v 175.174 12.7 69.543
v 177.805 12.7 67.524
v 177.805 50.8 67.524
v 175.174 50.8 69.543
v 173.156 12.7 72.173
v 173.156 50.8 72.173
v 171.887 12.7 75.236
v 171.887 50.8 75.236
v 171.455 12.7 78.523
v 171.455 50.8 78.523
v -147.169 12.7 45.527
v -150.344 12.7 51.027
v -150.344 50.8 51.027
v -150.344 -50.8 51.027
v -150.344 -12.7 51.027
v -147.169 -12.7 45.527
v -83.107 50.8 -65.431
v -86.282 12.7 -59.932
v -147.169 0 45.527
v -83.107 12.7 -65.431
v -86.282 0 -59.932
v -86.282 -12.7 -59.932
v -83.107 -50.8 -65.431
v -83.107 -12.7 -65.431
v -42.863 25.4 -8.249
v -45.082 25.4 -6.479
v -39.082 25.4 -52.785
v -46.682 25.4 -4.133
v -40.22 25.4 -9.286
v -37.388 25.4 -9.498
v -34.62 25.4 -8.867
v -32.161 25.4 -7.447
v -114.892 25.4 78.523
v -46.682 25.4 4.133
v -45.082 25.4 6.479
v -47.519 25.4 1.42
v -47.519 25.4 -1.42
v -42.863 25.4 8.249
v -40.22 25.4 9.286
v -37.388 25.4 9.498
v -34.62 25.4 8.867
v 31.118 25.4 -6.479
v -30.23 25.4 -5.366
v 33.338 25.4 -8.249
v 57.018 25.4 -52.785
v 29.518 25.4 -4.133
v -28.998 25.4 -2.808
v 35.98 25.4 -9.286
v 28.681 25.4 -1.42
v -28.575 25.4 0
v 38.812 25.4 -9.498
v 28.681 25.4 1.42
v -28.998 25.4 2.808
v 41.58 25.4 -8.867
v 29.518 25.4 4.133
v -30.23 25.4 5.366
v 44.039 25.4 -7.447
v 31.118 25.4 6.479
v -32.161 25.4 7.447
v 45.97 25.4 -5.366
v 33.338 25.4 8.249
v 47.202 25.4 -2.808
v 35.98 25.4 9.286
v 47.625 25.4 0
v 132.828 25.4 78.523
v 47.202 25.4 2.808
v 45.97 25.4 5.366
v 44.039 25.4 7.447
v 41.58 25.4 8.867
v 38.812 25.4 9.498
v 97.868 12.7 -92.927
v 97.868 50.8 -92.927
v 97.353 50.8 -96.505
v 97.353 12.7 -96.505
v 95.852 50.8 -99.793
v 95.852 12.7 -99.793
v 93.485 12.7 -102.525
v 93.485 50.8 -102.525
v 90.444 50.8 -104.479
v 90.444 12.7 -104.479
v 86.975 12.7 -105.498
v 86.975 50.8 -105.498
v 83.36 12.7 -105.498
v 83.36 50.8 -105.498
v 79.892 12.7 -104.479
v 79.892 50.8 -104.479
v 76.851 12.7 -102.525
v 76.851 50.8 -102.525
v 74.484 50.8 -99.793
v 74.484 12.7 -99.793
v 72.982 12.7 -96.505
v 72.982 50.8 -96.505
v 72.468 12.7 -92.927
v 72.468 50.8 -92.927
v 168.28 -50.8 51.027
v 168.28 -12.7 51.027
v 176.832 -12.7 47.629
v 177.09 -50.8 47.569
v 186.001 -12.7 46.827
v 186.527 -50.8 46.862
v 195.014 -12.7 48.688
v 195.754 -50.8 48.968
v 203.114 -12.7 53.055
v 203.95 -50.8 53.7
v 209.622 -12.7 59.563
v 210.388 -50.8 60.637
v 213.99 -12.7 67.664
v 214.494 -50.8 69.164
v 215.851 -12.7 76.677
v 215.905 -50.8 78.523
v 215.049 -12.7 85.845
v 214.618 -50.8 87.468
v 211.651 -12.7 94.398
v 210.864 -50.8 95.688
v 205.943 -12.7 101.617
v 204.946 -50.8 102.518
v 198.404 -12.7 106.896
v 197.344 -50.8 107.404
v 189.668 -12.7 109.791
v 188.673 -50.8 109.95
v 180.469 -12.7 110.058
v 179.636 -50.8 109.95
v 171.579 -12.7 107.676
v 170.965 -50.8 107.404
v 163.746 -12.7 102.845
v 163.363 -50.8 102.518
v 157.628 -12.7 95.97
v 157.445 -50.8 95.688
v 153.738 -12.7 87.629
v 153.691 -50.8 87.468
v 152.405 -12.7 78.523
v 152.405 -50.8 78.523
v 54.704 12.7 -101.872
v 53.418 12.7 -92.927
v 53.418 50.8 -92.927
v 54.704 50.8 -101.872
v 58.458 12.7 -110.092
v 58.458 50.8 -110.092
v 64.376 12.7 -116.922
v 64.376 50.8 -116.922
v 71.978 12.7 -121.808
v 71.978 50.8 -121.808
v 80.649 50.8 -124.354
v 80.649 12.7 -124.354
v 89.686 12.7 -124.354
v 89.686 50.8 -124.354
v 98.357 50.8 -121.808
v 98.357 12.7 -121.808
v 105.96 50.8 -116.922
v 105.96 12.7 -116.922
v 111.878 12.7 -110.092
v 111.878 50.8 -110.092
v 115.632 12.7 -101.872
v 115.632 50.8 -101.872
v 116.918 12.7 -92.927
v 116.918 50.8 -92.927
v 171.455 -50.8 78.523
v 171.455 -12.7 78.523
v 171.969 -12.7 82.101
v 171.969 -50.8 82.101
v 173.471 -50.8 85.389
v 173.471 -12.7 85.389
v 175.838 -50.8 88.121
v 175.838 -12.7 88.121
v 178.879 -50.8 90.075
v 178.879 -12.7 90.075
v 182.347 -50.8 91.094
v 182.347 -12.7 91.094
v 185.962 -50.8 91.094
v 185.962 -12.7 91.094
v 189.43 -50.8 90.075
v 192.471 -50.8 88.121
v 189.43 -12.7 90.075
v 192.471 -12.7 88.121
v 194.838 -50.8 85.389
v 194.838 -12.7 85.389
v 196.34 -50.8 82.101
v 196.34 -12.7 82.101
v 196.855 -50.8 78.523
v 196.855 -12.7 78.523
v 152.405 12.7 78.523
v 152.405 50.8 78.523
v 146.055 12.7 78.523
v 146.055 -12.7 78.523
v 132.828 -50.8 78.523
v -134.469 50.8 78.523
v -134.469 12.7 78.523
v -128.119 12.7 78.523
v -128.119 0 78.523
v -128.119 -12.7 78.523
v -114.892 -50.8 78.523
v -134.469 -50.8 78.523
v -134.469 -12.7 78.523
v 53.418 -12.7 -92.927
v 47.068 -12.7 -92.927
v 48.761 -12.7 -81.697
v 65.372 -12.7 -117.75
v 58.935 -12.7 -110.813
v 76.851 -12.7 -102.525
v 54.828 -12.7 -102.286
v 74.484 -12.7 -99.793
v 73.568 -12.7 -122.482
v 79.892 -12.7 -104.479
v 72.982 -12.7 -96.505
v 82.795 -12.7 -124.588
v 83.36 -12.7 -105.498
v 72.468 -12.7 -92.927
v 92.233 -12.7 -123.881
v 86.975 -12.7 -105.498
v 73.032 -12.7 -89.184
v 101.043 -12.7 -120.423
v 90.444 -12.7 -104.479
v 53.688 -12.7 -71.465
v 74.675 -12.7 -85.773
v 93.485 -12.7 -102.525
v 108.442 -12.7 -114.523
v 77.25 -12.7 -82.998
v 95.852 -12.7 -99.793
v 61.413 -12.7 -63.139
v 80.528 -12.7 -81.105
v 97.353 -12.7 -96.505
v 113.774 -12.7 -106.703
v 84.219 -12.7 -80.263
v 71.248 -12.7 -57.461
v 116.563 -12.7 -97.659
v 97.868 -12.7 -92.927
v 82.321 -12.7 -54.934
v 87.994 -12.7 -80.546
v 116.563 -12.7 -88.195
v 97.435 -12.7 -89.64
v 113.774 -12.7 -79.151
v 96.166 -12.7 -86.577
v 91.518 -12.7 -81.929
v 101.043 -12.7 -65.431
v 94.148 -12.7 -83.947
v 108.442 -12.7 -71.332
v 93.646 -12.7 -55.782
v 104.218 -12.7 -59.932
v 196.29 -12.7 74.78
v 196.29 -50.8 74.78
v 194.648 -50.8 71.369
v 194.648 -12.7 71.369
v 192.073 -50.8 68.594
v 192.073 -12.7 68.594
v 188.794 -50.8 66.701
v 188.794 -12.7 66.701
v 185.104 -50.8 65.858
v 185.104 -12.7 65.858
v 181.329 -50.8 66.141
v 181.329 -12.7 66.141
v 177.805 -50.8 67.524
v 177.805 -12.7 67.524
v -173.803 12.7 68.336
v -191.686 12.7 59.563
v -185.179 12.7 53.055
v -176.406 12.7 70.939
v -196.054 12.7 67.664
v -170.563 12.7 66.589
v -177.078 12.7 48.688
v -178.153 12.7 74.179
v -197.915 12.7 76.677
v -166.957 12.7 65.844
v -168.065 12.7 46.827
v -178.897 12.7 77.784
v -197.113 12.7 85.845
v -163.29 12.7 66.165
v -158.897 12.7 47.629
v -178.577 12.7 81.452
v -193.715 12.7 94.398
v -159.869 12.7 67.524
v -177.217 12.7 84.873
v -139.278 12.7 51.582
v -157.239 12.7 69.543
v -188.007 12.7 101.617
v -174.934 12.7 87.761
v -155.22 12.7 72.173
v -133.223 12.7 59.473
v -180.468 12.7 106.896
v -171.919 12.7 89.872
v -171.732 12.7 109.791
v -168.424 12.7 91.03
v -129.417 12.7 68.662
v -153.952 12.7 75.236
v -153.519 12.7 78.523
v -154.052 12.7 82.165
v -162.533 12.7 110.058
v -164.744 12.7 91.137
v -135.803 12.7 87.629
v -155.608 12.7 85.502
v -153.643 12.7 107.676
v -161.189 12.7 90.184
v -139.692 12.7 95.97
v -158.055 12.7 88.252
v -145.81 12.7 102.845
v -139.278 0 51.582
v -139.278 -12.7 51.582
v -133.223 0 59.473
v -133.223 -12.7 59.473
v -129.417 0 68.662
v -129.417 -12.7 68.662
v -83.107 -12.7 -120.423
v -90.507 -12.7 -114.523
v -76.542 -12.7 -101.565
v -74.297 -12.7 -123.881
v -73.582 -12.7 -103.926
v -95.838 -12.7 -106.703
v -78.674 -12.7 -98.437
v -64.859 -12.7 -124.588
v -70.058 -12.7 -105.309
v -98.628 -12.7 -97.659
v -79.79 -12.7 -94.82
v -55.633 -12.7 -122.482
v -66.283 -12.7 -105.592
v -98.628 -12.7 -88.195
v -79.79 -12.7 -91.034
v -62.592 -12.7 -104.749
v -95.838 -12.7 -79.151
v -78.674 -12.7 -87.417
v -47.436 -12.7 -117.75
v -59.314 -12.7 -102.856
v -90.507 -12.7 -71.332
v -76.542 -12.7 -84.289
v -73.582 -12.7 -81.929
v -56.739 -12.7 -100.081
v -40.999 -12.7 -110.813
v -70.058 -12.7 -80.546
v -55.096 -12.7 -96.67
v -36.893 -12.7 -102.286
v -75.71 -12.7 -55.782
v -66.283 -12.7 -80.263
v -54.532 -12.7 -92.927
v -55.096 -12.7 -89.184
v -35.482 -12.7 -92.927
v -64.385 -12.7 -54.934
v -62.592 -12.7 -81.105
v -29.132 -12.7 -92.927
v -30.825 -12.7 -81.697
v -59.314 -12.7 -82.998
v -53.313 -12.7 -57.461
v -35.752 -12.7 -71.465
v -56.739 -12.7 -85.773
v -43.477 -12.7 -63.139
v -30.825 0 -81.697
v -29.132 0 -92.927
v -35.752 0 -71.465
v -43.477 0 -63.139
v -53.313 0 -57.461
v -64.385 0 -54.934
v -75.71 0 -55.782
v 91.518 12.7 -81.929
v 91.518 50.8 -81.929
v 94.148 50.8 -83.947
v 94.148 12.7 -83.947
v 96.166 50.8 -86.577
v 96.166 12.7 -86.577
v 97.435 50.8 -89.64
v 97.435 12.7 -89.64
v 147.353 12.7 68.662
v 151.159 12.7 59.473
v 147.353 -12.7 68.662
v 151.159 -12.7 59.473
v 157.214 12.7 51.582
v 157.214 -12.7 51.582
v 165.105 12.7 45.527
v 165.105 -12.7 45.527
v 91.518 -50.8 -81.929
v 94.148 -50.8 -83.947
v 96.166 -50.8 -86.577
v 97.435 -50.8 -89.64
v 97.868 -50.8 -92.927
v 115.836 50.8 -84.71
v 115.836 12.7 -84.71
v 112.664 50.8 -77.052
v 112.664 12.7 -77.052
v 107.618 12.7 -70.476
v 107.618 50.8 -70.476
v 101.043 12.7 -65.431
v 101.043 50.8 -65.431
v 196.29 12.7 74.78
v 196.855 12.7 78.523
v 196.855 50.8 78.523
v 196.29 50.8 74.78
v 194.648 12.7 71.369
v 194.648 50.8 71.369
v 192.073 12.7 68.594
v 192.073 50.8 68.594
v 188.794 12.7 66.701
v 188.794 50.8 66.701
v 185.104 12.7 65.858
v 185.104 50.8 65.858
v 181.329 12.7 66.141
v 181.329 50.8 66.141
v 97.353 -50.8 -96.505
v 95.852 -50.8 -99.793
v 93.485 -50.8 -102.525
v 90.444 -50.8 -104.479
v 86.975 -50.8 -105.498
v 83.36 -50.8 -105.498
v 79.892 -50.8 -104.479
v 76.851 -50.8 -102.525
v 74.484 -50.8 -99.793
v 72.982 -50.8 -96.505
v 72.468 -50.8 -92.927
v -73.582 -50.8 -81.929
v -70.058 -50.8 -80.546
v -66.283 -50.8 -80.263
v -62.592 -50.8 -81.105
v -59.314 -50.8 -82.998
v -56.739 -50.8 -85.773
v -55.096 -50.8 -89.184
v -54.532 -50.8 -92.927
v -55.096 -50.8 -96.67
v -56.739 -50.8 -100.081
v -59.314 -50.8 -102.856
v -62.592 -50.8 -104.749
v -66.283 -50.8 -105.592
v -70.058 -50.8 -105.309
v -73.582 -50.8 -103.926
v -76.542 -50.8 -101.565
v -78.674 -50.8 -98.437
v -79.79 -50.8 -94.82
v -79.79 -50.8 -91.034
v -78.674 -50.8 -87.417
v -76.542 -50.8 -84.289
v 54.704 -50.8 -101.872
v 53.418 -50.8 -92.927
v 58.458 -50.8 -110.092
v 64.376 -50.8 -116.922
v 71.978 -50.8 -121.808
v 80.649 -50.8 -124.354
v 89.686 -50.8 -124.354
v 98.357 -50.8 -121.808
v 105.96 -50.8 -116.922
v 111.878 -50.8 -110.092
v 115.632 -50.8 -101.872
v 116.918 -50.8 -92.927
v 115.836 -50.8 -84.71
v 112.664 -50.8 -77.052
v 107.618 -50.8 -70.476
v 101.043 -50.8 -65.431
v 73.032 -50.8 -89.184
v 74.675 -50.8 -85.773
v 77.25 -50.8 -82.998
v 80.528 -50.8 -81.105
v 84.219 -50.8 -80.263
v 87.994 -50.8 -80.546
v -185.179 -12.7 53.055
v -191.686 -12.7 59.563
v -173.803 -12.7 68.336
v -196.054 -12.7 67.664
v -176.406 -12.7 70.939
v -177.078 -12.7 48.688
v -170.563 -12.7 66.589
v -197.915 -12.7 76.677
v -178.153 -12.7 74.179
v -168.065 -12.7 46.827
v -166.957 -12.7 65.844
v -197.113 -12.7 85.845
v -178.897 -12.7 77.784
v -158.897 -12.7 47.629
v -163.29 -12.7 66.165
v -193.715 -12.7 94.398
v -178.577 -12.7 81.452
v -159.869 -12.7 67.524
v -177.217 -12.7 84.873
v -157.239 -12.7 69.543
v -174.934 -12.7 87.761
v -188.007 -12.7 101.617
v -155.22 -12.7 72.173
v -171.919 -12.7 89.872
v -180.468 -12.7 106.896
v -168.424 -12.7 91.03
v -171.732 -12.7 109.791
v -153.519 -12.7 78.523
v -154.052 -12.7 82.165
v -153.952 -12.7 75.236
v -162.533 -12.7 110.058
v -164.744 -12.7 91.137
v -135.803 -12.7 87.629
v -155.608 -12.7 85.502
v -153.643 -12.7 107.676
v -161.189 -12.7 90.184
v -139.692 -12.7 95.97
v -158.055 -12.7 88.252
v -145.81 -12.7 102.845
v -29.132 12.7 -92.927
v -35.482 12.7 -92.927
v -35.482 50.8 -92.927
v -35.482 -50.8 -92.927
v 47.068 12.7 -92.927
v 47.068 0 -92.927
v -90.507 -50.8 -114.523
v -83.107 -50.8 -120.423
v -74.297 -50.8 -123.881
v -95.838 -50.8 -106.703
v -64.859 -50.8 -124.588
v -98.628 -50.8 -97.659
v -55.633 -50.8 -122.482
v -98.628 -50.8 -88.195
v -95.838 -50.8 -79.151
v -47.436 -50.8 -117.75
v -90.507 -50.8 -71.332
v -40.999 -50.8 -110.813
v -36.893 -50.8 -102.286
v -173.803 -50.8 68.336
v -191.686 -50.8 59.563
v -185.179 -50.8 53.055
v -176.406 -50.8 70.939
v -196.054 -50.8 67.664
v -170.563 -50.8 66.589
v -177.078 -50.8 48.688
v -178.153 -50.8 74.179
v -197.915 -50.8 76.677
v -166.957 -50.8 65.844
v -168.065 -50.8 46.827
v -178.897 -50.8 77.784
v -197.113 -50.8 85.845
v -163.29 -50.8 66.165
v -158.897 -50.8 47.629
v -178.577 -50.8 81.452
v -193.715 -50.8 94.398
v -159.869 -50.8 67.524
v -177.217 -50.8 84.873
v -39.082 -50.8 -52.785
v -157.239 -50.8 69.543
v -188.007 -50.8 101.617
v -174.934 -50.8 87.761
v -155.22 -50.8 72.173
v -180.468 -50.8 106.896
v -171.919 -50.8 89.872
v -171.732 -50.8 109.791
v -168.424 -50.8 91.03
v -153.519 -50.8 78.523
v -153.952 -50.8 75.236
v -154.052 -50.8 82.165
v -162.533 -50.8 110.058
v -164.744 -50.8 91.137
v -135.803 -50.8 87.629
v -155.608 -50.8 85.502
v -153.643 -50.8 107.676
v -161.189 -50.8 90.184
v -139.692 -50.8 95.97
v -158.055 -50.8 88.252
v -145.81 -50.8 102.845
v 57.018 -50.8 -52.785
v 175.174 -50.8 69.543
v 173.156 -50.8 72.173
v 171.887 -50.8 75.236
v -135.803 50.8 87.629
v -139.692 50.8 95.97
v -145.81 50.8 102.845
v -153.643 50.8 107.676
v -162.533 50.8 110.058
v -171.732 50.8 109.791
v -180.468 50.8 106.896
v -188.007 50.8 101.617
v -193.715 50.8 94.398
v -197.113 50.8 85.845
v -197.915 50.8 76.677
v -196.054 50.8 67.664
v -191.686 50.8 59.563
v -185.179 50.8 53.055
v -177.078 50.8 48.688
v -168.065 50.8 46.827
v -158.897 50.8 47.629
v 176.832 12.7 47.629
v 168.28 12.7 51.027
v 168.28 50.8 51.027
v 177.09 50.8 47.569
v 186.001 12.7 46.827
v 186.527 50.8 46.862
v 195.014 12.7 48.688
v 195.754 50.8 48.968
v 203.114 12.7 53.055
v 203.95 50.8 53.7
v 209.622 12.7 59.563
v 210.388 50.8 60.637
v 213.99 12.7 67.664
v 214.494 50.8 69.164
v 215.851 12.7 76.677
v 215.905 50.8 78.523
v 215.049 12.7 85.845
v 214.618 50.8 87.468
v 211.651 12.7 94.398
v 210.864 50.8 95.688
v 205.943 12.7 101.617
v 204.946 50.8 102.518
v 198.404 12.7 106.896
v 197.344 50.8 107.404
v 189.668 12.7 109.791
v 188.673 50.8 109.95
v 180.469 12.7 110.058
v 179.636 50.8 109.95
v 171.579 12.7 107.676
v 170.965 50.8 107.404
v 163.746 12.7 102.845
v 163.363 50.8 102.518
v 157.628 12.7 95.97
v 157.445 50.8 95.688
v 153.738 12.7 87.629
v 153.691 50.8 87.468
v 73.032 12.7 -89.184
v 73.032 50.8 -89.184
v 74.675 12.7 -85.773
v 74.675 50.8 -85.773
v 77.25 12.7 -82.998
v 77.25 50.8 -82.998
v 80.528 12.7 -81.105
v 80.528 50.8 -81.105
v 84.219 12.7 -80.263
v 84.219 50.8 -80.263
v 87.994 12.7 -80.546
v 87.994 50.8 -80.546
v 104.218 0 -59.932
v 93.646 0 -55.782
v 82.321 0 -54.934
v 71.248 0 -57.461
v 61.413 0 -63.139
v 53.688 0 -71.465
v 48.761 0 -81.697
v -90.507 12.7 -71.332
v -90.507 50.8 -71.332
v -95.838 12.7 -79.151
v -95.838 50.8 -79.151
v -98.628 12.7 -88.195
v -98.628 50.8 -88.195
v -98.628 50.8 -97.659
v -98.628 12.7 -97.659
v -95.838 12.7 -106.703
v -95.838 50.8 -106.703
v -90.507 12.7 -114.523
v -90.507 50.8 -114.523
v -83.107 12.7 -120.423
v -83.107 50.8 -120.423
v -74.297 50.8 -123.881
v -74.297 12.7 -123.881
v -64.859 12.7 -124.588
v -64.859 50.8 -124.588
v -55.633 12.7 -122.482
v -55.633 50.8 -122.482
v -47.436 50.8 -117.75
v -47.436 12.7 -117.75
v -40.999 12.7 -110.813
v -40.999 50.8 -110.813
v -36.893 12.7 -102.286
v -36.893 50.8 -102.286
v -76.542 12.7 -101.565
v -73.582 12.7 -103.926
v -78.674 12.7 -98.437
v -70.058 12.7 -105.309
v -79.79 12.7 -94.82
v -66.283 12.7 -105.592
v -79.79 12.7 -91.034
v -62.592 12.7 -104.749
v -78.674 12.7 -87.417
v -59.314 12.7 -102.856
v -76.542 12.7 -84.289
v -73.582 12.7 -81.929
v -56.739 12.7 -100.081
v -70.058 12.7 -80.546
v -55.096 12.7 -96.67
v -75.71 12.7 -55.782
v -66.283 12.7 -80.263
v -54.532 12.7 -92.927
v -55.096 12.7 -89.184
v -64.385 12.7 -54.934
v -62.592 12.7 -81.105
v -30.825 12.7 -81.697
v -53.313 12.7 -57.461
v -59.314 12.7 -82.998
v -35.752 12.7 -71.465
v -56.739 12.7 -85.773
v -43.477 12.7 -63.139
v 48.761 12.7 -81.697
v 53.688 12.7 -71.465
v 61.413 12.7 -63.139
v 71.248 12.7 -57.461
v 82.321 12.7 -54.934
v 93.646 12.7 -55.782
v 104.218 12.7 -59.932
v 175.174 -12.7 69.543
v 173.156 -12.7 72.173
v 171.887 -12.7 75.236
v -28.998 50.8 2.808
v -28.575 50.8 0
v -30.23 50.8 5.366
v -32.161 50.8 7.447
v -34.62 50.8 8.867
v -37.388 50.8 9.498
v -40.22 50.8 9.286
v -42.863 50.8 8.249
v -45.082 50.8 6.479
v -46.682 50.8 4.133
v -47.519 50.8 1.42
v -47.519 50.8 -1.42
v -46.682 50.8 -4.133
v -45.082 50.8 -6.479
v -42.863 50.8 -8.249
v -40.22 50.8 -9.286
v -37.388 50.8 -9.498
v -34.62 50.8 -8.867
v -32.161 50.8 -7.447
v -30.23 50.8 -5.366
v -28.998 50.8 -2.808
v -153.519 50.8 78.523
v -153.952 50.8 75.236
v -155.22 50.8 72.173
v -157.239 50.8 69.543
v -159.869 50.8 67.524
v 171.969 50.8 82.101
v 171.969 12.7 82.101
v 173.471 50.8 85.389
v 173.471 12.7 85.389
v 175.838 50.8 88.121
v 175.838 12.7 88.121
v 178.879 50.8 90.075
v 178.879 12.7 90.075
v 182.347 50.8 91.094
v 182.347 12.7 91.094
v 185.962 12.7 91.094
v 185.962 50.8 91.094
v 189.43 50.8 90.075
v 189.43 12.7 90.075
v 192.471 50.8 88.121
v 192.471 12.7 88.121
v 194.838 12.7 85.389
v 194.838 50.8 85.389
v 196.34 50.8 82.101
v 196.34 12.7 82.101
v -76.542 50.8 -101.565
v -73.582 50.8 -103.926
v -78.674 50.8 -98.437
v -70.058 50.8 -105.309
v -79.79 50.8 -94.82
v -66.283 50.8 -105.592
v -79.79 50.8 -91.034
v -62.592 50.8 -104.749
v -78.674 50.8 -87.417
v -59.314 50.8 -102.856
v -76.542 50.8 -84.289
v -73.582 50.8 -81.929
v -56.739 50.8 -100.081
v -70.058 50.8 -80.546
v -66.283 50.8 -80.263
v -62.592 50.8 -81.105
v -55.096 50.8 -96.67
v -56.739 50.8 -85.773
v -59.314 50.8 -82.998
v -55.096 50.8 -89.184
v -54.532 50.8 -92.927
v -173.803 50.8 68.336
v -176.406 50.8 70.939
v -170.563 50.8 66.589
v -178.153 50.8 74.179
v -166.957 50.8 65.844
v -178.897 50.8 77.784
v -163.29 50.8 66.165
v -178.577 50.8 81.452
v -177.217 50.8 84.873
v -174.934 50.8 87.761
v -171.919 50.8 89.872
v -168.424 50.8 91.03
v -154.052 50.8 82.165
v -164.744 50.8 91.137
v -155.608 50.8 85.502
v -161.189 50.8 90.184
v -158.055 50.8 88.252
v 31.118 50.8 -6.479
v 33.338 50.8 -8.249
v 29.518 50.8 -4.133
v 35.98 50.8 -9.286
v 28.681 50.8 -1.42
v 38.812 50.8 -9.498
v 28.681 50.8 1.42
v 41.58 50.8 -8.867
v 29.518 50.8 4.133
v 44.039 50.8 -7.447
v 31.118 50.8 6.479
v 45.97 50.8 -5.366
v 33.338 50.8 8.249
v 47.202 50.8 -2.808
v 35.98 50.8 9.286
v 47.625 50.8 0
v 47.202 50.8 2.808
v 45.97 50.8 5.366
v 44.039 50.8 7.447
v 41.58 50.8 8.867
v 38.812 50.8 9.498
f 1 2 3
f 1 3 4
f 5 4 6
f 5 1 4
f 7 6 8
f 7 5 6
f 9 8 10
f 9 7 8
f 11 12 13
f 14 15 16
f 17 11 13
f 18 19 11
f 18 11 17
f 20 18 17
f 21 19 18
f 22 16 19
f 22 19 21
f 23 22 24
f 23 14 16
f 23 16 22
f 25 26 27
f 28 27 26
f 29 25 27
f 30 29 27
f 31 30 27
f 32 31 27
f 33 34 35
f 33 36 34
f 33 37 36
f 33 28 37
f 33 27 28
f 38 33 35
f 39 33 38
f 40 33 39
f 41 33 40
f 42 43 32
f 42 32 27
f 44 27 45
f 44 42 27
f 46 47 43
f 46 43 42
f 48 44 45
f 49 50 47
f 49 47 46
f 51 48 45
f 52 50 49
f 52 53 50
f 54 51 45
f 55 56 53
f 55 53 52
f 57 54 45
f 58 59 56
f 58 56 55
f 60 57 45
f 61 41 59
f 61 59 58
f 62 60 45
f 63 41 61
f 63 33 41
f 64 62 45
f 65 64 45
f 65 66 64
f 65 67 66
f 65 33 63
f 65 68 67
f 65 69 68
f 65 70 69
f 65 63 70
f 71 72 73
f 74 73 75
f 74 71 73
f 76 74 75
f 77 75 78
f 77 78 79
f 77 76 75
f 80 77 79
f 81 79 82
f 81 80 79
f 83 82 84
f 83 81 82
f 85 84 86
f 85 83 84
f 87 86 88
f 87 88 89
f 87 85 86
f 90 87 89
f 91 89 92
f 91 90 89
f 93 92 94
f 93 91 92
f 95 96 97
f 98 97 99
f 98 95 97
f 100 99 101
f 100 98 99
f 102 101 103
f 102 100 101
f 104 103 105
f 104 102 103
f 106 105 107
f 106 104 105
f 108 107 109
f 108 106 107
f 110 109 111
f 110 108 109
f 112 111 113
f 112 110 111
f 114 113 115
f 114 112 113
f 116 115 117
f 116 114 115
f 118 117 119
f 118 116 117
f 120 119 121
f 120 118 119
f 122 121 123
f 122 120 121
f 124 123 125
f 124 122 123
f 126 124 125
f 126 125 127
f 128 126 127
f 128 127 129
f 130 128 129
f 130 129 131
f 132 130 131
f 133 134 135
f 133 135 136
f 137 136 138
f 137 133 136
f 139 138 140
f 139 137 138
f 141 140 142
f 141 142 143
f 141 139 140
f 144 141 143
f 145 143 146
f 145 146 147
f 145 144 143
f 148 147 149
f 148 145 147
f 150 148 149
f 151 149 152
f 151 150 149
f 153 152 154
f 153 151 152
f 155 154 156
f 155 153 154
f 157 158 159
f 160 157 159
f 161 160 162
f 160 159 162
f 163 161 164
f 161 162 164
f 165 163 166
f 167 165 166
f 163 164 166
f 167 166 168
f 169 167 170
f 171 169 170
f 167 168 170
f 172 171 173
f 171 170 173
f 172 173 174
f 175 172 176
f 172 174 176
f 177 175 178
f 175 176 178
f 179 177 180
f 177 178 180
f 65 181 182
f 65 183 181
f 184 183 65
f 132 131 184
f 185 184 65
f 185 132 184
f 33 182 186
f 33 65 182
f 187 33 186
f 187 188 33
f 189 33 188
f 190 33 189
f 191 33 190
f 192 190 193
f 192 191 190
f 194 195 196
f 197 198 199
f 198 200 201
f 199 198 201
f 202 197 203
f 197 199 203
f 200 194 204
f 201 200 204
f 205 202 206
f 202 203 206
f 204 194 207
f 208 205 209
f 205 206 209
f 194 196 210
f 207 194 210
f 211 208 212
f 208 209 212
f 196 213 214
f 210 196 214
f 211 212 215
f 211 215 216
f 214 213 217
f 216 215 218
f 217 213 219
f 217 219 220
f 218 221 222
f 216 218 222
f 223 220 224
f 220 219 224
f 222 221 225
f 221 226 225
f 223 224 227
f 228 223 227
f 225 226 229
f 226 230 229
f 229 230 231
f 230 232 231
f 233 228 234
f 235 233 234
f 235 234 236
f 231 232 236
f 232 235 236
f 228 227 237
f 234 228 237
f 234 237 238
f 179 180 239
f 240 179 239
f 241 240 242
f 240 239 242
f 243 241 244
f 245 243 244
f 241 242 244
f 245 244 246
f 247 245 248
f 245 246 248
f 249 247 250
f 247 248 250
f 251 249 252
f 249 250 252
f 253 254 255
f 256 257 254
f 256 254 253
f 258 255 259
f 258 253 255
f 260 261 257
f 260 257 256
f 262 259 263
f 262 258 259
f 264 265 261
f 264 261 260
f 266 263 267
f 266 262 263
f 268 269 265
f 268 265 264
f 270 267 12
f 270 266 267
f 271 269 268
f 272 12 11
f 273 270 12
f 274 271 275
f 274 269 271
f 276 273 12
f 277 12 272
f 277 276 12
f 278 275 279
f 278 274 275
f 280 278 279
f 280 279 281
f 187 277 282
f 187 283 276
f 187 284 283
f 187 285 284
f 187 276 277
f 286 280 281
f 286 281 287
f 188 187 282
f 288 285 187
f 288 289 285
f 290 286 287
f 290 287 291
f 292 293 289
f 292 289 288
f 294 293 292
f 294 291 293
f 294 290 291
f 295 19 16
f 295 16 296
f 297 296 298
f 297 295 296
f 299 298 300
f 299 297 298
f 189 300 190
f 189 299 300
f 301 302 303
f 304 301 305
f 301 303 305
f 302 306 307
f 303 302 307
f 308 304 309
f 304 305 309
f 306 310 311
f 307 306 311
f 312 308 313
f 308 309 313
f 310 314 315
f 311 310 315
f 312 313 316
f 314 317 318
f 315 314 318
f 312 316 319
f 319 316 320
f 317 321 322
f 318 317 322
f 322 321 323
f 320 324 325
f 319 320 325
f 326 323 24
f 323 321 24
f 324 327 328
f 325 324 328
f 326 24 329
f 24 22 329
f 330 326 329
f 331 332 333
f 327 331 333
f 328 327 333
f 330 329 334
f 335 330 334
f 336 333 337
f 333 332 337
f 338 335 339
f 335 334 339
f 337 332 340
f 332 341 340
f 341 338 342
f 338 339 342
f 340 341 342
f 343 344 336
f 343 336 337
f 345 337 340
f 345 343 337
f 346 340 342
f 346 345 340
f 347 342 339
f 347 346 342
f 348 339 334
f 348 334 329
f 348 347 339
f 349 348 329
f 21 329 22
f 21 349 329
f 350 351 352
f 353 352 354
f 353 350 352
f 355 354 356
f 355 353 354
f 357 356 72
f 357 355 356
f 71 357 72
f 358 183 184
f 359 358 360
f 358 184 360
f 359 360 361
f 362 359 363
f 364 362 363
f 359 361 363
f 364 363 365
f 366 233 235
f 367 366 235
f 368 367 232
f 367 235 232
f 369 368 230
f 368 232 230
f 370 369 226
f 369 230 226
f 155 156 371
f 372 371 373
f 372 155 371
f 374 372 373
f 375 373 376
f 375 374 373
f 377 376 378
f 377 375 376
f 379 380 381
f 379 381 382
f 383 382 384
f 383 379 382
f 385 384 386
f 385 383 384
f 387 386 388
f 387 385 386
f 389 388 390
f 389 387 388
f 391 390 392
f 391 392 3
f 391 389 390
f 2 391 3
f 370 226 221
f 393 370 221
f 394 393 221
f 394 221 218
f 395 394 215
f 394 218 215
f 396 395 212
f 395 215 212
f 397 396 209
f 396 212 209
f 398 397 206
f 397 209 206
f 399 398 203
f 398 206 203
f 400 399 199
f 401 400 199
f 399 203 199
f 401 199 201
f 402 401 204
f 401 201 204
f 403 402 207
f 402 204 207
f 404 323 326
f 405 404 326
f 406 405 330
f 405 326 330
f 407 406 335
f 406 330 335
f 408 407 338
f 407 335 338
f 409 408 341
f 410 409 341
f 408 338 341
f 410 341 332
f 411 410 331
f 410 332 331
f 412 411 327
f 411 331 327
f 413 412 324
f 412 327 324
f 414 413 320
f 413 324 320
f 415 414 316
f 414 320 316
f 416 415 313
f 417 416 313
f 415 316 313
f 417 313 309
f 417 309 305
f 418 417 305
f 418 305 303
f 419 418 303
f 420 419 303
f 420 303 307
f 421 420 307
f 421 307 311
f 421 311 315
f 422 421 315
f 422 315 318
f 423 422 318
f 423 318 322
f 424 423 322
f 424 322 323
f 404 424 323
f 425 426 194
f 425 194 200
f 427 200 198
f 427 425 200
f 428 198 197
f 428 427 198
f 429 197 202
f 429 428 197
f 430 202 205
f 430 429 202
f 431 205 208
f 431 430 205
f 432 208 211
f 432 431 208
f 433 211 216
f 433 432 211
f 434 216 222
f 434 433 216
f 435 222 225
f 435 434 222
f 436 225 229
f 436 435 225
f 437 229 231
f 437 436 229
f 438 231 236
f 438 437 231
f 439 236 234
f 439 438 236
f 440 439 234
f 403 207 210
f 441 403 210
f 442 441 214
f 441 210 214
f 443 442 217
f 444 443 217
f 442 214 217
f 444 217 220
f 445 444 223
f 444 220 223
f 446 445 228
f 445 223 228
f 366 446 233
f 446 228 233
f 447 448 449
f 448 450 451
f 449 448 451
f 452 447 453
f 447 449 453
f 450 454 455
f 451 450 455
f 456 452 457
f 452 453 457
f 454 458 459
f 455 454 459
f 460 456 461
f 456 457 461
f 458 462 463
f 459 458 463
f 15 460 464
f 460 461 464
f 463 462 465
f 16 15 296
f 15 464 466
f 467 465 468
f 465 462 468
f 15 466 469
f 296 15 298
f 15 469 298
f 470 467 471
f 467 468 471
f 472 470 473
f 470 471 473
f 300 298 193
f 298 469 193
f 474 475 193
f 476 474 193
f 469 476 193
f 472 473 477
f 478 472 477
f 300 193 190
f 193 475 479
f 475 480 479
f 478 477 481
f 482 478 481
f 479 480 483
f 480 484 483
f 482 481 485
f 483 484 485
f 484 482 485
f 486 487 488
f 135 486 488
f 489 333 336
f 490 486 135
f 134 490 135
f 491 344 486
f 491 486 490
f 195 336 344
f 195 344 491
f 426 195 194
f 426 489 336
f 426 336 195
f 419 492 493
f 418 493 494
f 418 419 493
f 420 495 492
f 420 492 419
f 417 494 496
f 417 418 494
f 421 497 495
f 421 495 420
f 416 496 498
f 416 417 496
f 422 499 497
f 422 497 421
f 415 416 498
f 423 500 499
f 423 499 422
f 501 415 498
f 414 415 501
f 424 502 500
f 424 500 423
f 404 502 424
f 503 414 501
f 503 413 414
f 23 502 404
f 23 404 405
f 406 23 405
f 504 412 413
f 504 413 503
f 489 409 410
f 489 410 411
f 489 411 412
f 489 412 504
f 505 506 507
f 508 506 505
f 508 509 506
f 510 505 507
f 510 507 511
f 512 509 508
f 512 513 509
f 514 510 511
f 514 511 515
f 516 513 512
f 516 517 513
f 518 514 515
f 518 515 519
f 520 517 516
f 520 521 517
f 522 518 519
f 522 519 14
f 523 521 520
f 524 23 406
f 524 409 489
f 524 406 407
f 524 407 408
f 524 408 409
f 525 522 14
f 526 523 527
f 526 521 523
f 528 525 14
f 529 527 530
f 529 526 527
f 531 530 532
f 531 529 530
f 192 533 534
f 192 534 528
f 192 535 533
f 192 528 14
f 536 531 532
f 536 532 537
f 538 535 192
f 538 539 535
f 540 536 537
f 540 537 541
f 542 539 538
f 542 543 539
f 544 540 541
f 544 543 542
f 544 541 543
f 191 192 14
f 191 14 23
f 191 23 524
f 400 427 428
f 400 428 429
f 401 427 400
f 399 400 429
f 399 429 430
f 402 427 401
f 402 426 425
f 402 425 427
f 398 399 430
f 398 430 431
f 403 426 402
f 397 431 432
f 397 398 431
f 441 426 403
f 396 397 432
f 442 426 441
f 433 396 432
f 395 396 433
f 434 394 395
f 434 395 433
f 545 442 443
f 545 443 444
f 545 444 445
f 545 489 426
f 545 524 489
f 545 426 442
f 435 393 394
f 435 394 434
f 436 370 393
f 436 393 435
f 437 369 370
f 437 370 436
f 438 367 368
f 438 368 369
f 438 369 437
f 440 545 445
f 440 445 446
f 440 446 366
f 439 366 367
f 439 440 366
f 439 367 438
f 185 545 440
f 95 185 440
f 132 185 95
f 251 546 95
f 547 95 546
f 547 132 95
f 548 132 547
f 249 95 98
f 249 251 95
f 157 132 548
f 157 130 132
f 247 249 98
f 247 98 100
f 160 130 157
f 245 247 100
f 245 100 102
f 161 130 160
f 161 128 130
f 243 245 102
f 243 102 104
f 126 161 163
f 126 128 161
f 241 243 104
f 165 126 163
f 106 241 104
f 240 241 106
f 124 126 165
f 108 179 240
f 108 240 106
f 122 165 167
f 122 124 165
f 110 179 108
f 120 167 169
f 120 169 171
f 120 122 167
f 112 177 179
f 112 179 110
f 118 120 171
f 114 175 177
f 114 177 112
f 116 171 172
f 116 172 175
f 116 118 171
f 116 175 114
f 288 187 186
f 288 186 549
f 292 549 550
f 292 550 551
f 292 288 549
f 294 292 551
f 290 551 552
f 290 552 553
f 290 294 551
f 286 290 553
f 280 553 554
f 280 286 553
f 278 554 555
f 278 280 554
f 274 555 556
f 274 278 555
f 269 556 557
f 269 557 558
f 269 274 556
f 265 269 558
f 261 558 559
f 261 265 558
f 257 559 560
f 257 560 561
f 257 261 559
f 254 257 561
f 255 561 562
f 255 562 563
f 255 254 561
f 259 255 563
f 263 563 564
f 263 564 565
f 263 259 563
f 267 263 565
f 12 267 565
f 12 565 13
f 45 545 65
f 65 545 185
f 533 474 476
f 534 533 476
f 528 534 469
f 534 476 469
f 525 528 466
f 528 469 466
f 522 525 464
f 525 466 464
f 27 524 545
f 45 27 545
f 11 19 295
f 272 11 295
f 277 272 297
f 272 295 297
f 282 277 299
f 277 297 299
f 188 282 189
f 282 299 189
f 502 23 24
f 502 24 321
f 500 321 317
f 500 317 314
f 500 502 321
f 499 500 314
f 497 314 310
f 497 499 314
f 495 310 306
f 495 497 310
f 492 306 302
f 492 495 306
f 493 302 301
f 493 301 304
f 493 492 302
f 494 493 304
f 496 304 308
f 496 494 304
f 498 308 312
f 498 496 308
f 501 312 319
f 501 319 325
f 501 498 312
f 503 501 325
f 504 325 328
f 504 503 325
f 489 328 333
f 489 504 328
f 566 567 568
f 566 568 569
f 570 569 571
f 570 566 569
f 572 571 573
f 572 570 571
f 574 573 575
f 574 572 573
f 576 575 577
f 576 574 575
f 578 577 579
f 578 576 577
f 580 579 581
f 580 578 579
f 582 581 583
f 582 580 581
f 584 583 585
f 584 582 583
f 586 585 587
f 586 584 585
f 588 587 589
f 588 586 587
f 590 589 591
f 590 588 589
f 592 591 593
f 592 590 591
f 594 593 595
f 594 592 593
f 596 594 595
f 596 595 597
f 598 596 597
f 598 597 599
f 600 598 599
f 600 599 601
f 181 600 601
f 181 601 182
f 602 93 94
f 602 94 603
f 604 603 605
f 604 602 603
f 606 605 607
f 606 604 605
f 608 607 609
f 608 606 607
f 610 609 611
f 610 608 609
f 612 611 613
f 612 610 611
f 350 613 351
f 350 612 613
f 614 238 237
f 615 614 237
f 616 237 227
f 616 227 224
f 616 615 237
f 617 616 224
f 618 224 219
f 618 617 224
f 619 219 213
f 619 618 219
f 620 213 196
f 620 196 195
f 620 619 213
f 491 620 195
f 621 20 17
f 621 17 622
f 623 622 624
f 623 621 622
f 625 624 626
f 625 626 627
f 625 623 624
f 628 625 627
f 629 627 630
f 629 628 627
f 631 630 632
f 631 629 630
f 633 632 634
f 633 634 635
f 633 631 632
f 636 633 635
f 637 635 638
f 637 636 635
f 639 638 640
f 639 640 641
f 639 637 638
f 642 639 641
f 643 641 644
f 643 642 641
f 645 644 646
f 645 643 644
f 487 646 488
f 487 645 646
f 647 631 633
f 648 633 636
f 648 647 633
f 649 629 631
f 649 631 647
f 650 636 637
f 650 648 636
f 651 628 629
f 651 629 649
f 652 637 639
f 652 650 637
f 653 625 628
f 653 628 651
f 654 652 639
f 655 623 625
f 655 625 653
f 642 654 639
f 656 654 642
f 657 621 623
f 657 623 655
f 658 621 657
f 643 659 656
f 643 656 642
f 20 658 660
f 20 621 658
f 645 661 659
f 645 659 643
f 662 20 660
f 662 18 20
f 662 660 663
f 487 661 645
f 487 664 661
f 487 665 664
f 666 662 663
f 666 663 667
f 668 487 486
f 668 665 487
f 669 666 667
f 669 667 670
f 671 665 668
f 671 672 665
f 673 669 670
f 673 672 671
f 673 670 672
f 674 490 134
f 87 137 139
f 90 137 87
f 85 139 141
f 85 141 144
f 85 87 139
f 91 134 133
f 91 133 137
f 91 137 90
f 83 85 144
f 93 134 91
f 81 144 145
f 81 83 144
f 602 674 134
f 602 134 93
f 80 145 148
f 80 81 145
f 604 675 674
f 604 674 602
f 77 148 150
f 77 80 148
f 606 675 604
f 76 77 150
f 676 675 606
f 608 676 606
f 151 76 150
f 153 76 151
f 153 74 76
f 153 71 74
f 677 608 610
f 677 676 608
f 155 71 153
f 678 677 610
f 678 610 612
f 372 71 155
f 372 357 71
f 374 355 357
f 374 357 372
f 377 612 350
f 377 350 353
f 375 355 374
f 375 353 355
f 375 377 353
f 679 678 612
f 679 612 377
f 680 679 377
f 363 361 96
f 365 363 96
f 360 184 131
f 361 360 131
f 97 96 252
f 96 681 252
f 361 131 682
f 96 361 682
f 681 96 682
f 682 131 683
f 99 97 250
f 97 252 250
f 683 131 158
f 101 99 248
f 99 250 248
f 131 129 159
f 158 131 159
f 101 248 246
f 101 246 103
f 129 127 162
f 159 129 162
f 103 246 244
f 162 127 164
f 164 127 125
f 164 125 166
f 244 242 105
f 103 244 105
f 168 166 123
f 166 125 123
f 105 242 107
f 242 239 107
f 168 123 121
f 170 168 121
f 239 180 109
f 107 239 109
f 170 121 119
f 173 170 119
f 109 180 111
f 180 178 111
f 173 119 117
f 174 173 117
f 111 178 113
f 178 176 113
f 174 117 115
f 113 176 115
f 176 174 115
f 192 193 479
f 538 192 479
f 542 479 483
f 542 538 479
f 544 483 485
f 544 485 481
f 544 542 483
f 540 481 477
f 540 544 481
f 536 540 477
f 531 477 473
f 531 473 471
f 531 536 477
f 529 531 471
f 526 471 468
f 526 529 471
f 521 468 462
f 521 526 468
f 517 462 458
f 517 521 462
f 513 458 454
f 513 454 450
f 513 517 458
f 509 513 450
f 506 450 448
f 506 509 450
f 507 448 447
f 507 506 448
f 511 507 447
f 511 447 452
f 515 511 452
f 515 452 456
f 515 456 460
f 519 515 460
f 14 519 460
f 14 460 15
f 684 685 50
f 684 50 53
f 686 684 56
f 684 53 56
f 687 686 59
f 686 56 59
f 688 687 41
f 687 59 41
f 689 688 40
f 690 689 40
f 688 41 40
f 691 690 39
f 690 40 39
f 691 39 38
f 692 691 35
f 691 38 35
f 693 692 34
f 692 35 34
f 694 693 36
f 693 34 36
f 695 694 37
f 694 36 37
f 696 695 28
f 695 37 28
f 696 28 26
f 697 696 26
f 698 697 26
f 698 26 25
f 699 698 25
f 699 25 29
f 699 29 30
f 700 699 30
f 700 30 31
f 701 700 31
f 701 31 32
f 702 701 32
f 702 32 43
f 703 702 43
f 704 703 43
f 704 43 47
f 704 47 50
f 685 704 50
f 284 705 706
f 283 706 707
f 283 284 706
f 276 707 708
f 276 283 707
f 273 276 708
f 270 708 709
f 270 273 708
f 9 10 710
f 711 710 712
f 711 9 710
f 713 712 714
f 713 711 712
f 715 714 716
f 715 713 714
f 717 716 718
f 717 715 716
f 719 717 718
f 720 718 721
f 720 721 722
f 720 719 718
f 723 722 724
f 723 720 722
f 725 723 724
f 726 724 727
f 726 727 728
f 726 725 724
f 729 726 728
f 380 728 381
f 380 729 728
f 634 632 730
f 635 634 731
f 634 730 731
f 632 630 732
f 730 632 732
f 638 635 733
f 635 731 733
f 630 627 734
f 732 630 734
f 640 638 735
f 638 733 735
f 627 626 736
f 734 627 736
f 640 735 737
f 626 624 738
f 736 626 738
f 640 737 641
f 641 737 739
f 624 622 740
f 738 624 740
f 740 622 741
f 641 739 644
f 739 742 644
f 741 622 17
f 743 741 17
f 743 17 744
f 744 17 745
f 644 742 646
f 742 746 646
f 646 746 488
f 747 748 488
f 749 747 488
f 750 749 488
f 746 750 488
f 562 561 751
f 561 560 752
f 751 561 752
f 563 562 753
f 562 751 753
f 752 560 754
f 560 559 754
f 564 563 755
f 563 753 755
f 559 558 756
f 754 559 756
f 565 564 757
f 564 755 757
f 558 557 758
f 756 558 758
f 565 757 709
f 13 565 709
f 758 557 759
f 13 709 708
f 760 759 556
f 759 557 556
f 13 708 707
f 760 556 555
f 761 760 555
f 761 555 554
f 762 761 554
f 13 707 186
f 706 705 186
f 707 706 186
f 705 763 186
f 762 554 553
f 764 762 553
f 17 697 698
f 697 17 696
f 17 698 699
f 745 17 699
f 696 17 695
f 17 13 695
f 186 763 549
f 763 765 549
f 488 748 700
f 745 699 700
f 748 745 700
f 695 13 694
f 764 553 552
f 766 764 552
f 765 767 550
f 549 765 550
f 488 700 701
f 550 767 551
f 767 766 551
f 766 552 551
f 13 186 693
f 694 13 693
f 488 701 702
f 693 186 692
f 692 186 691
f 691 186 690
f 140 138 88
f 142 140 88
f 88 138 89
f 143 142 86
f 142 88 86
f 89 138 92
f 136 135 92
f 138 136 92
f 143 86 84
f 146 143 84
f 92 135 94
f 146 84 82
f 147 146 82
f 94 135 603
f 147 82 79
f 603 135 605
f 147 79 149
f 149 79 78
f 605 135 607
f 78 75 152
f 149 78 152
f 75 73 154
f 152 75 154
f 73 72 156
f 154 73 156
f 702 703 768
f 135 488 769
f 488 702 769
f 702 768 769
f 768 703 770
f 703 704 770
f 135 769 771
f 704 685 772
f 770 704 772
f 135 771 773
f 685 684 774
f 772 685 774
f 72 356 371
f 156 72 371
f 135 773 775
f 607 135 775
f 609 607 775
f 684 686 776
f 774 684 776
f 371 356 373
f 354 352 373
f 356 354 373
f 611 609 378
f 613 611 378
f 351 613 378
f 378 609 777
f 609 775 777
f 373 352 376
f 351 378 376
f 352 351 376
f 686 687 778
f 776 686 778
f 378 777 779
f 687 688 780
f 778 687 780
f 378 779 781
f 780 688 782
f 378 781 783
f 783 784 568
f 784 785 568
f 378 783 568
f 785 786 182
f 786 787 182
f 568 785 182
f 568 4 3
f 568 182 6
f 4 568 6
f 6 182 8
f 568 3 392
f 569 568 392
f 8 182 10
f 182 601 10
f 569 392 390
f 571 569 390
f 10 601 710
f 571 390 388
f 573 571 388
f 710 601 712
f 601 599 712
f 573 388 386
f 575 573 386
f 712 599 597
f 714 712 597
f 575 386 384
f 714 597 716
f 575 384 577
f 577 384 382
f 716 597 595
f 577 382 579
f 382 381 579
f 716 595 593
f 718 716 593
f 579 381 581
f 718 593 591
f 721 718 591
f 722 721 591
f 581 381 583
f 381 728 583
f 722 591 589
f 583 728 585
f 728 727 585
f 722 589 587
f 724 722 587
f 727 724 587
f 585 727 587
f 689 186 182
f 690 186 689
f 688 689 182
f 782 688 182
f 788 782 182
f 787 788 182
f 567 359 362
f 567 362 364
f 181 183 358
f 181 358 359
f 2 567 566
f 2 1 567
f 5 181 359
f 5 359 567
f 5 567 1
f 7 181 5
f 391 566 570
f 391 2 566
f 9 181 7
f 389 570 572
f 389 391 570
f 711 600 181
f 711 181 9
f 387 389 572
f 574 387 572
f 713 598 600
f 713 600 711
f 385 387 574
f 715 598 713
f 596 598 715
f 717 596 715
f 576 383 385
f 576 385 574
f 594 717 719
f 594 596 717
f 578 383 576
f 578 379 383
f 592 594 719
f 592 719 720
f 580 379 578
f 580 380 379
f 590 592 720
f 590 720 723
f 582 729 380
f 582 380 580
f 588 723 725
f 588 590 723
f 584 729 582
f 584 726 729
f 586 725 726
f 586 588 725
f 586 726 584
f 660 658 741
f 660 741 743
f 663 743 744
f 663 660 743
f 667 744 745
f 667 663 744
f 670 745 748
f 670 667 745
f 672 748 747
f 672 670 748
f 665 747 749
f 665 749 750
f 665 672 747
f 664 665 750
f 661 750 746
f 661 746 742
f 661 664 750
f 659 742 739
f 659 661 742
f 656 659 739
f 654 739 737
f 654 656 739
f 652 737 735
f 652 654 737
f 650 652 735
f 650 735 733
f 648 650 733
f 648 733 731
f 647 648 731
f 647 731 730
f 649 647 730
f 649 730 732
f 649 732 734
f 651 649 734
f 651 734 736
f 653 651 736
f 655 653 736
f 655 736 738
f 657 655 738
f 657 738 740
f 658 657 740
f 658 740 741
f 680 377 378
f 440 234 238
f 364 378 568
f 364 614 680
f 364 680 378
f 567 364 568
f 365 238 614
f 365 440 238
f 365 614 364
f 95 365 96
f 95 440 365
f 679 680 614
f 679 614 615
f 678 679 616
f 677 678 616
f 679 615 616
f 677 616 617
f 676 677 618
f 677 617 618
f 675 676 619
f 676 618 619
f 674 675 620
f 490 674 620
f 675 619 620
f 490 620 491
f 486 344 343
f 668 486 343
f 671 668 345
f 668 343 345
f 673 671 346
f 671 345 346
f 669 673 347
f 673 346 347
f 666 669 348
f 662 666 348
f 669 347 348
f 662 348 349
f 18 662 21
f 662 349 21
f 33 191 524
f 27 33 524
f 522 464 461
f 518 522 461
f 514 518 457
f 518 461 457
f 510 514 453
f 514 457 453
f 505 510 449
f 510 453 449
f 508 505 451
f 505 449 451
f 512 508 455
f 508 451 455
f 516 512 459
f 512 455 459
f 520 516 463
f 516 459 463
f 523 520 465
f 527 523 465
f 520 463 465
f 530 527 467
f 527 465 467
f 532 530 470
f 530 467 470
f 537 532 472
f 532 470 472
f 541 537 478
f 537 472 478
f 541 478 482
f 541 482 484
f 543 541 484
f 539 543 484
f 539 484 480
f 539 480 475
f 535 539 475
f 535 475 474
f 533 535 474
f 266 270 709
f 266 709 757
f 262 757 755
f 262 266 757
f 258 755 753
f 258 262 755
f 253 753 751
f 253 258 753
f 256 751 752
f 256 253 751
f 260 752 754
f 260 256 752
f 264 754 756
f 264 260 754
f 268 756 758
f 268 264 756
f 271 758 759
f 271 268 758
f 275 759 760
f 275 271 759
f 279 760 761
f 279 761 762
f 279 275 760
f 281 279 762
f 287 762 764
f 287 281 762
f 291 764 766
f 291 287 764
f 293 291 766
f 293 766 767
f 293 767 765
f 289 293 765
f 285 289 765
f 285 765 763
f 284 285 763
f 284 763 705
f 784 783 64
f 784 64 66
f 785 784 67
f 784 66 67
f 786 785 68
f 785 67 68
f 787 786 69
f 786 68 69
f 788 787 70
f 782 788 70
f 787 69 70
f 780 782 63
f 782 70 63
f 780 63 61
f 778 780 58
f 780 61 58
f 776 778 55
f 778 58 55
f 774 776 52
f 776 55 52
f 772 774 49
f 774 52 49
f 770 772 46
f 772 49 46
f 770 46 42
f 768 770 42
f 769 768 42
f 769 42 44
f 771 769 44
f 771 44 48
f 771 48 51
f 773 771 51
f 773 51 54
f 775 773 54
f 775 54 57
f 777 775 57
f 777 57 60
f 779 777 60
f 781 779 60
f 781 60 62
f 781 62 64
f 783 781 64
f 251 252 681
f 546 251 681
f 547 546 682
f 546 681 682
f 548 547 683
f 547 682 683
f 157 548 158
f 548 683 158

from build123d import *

# Parameters (mm, degrees)
F1_DEPTH = 50.8
F3_DEPTH = 76.2
F4_R     = 38.1
F5_DEPTH = 12.7
F6_R     = 9.525
F7_DEPTH = 25.401


with BuildPart() as f1:
    # F0 (on Front) → F1 (new body, symmetric)
    with BuildSketch(Plane.XZ):
        with BuildLine():
            ThreePointArc((-83.1071616711, -65.430798607), (-83.1071616711, -120.4234117473), (-35.4821616711, -92.9271051772))
            Line((-35.4821616711, -92.9271051772), (-54.5321616711, -92.9271051772))
            ThreePointArc((-54.5321616711, -92.9271051772), (-73.5821616711, -103.9256278052), (-73.5821616711, -81.9285825491))
            Line((-73.5821616711, -81.9285825491), (-83.1071616711, -65.430798607))
        make_face()
        with BuildLine():
            ThreePointArc((-83.1071616711, -65.430798607), (-51.3571616711, -65.430798607), (-35.4821616711, -92.9271051772))
            Line((-35.4821616711, -92.9271051772), (53.4178383289, -92.9271051772))
            ThreePointArc((53.4178383289, -92.9271051772), (69.2928383289, -65.430798607), (101.0428383289, -65.430798607))
            Line((101.0428383289, -65.430798607), (168.2795419814, 51.0265882527))
            ThreePointArc((168.2795419814, 51.0265882527), (156.6582354113, 62.6478948228), (152.4045419814, 78.5228948228))
            Line((152.4045419814, 78.5228948228), (-134.4688653237, 78.5228948228))
            ThreePointArc((-134.4688653237, 78.5228948228), (-138.7225587535, 62.6478948228), (-150.3438653237, 51.0265882527))
            Line((-150.3438653237, 51.0265882527), (-83.1071616711, -65.430798607))
        make_face()
        with BuildLine():
            Line((-54.5321616711, -92.9271051772), (-35.4821616711, -92.9271051772))
            ThreePointArc((-35.4821616711, -92.9271051772), (-51.3571616711, -65.430798607), (-83.1071616711, -65.430798607))
            Line((-83.1071616711, -65.430798607), (-73.5821616711, -81.9285825491))
            ThreePointArc((-73.5821616711, -81.9285825491), (-60.8821616711, -81.9285825491), (-54.5321616711, -92.9271051772))
        make_face()
        with BuildLine():
            ThreePointArc((101.0428383289, -65.430798607), (69.2928383289, -65.430798607), (53.4178383289, -92.9271051772))
            Line((53.4178383289, -92.9271051772), (72.4678383289, -92.9271051772))
            ThreePointArc((72.4678383289, -92.9271051772), (78.8178383289, -81.9285825491), (91.5178383289, -81.9285825491))
            Line((91.5178383289, -81.9285825491), (101.0428383289, -65.430798607))
        make_face()
        with BuildLine():
            Line((72.4678383289, -92.9271051772), (53.4178383289, -92.9271051772))
            ThreePointArc((53.4178383289, -92.9271051772), (85.1678383289, -124.6771051772), (116.9178383289, -92.9271051772))
            ThreePointArc((116.9178383289, -92.9271051772), (112.664144899, -77.0521051772), (101.0428383289, -65.430798607))
            Line((101.0428383289, -65.430798607), (91.5178383289, -81.9285825491))
            ThreePointArc((91.5178383289, -81.9285825491), (96.1663609569, -86.5771051772), (97.8678383289, -92.9271051772))
            ThreePointArc((97.8678383289, -92.9271051772), (85.1678383289, -105.6271051772), (72.4678383289, -92.9271051772))
        make_face()
        with BuildLine():
            ThreePointArc((-134.4688653237, 78.5228948228), (-193.7151718938, 94.3978948228), (-150.3438653237, 51.0265882527))
            Line((-150.3438653237, 51.0265882527), (-159.8688653237, 67.5243721948))
            ThreePointArc((-159.8688653237, 67.5243721948), (-177.2173879518, 84.8728948228), (-153.5188653237, 78.5228948228))
            Line((-153.5188653237, 78.5228948228), (-134.4688653237, 78.5228948228))
        make_face()
        with BuildLine():
            Line((-159.8688653237, 67.5243721948), (-150.3438653237, 51.0265882527))
            ThreePointArc((-150.3438653237, 51.0265882527), (-138.7225587535, 62.6478948228), (-134.4688653237, 78.5228948228))
            Line((-134.4688653237, 78.5228948228), (-153.5188653237, 78.5228948228))
            ThreePointArc((-153.5188653237, 78.5228948228), (-155.2203426956, 72.1728948228), (-159.8688653237, 67.5243721948))
        make_face()
        with BuildLine():
            ThreePointArc((152.4045419814, 78.5228948228), (156.6582354113, 62.6478948228), (168.2795419814, 51.0265882527))
            Line((168.2795419814, 51.0265882527), (177.8045419814, 67.5243721948))
            ThreePointArc((177.8045419814, 67.5243721948), (173.1560193534, 72.1728948228), (171.4545419814, 78.5228948228))
            Line((171.4545419814, 78.5228948228), (152.4045419814, 78.5228948228))
        make_face()
        with BuildLine():
            Line((177.8045419814, 67.5243721948), (168.2795419814, 51.0265882527))
            ThreePointArc((168.2795419814, 51.0265882527), (200.0295419814, 51.0265882527), (215.9045419814, 78.5228948228))
            ThreePointArc((215.9045419814, 78.5228948228), (184.1545419814, 110.2728948228), (152.4045419814, 78.5228948228))
            Line((152.4045419814, 78.5228948228), (171.4545419814, 78.5228948228))
            ThreePointArc((171.4545419814, 78.5228948228), (184.1545419814, 91.2228948228), (196.8545419814, 78.5228948228))
            ThreePointArc((196.8545419814, 78.5228948228), (190.5045419814, 67.5243721948), (177.8045419814, 67.5243721948))
        make_face()
    extrude(amount=F1_DEPTH, both=True)

    # F2 (on face) → F3 (cut)
    with BuildSketch(Plane.XZ.offset(50.8)):
        Polygon((132.8281030505, 78.5228948228), (-114.8924263927, 78.5228948228), (-39.0819515524, -52.7846993466), (57.0176282101, -52.7846993466), align=None)
    extrude(amount=-F3_DEPTH, mode=Mode.SUBTRACT)

    # F4 (on Front) → F5 (cut, symmetric)
    with BuildSketch(Plane.XZ):
        with Locations((-166.2188653237, 78.5228948228)):
            Circle(F4_R)
        with Locations((-67.2321616711, -92.9271051772)):
            Circle(F4_R)
        with Locations((85.1678383289, -92.9271051772)):
            Circle(F4_R)
        with Locations((184.1545419814, 78.5228948228)):
            Circle(F4_R)
    extrude(amount=F5_DEPTH, both=True, mode=Mode.SUBTRACT)

    # F6 (on face) → F7 (cut, through all)
    with BuildSketch(Plane.XZ.offset(-25.4)):
        with Locations((-38.1, 0)):
            Circle(F6_R)
        with Locations((38.1, 0)):
            Circle(F6_R)
    extrude(amount=-F7_DEPTH, mode=Mode.SUBTRACT)


solid = f1.part
